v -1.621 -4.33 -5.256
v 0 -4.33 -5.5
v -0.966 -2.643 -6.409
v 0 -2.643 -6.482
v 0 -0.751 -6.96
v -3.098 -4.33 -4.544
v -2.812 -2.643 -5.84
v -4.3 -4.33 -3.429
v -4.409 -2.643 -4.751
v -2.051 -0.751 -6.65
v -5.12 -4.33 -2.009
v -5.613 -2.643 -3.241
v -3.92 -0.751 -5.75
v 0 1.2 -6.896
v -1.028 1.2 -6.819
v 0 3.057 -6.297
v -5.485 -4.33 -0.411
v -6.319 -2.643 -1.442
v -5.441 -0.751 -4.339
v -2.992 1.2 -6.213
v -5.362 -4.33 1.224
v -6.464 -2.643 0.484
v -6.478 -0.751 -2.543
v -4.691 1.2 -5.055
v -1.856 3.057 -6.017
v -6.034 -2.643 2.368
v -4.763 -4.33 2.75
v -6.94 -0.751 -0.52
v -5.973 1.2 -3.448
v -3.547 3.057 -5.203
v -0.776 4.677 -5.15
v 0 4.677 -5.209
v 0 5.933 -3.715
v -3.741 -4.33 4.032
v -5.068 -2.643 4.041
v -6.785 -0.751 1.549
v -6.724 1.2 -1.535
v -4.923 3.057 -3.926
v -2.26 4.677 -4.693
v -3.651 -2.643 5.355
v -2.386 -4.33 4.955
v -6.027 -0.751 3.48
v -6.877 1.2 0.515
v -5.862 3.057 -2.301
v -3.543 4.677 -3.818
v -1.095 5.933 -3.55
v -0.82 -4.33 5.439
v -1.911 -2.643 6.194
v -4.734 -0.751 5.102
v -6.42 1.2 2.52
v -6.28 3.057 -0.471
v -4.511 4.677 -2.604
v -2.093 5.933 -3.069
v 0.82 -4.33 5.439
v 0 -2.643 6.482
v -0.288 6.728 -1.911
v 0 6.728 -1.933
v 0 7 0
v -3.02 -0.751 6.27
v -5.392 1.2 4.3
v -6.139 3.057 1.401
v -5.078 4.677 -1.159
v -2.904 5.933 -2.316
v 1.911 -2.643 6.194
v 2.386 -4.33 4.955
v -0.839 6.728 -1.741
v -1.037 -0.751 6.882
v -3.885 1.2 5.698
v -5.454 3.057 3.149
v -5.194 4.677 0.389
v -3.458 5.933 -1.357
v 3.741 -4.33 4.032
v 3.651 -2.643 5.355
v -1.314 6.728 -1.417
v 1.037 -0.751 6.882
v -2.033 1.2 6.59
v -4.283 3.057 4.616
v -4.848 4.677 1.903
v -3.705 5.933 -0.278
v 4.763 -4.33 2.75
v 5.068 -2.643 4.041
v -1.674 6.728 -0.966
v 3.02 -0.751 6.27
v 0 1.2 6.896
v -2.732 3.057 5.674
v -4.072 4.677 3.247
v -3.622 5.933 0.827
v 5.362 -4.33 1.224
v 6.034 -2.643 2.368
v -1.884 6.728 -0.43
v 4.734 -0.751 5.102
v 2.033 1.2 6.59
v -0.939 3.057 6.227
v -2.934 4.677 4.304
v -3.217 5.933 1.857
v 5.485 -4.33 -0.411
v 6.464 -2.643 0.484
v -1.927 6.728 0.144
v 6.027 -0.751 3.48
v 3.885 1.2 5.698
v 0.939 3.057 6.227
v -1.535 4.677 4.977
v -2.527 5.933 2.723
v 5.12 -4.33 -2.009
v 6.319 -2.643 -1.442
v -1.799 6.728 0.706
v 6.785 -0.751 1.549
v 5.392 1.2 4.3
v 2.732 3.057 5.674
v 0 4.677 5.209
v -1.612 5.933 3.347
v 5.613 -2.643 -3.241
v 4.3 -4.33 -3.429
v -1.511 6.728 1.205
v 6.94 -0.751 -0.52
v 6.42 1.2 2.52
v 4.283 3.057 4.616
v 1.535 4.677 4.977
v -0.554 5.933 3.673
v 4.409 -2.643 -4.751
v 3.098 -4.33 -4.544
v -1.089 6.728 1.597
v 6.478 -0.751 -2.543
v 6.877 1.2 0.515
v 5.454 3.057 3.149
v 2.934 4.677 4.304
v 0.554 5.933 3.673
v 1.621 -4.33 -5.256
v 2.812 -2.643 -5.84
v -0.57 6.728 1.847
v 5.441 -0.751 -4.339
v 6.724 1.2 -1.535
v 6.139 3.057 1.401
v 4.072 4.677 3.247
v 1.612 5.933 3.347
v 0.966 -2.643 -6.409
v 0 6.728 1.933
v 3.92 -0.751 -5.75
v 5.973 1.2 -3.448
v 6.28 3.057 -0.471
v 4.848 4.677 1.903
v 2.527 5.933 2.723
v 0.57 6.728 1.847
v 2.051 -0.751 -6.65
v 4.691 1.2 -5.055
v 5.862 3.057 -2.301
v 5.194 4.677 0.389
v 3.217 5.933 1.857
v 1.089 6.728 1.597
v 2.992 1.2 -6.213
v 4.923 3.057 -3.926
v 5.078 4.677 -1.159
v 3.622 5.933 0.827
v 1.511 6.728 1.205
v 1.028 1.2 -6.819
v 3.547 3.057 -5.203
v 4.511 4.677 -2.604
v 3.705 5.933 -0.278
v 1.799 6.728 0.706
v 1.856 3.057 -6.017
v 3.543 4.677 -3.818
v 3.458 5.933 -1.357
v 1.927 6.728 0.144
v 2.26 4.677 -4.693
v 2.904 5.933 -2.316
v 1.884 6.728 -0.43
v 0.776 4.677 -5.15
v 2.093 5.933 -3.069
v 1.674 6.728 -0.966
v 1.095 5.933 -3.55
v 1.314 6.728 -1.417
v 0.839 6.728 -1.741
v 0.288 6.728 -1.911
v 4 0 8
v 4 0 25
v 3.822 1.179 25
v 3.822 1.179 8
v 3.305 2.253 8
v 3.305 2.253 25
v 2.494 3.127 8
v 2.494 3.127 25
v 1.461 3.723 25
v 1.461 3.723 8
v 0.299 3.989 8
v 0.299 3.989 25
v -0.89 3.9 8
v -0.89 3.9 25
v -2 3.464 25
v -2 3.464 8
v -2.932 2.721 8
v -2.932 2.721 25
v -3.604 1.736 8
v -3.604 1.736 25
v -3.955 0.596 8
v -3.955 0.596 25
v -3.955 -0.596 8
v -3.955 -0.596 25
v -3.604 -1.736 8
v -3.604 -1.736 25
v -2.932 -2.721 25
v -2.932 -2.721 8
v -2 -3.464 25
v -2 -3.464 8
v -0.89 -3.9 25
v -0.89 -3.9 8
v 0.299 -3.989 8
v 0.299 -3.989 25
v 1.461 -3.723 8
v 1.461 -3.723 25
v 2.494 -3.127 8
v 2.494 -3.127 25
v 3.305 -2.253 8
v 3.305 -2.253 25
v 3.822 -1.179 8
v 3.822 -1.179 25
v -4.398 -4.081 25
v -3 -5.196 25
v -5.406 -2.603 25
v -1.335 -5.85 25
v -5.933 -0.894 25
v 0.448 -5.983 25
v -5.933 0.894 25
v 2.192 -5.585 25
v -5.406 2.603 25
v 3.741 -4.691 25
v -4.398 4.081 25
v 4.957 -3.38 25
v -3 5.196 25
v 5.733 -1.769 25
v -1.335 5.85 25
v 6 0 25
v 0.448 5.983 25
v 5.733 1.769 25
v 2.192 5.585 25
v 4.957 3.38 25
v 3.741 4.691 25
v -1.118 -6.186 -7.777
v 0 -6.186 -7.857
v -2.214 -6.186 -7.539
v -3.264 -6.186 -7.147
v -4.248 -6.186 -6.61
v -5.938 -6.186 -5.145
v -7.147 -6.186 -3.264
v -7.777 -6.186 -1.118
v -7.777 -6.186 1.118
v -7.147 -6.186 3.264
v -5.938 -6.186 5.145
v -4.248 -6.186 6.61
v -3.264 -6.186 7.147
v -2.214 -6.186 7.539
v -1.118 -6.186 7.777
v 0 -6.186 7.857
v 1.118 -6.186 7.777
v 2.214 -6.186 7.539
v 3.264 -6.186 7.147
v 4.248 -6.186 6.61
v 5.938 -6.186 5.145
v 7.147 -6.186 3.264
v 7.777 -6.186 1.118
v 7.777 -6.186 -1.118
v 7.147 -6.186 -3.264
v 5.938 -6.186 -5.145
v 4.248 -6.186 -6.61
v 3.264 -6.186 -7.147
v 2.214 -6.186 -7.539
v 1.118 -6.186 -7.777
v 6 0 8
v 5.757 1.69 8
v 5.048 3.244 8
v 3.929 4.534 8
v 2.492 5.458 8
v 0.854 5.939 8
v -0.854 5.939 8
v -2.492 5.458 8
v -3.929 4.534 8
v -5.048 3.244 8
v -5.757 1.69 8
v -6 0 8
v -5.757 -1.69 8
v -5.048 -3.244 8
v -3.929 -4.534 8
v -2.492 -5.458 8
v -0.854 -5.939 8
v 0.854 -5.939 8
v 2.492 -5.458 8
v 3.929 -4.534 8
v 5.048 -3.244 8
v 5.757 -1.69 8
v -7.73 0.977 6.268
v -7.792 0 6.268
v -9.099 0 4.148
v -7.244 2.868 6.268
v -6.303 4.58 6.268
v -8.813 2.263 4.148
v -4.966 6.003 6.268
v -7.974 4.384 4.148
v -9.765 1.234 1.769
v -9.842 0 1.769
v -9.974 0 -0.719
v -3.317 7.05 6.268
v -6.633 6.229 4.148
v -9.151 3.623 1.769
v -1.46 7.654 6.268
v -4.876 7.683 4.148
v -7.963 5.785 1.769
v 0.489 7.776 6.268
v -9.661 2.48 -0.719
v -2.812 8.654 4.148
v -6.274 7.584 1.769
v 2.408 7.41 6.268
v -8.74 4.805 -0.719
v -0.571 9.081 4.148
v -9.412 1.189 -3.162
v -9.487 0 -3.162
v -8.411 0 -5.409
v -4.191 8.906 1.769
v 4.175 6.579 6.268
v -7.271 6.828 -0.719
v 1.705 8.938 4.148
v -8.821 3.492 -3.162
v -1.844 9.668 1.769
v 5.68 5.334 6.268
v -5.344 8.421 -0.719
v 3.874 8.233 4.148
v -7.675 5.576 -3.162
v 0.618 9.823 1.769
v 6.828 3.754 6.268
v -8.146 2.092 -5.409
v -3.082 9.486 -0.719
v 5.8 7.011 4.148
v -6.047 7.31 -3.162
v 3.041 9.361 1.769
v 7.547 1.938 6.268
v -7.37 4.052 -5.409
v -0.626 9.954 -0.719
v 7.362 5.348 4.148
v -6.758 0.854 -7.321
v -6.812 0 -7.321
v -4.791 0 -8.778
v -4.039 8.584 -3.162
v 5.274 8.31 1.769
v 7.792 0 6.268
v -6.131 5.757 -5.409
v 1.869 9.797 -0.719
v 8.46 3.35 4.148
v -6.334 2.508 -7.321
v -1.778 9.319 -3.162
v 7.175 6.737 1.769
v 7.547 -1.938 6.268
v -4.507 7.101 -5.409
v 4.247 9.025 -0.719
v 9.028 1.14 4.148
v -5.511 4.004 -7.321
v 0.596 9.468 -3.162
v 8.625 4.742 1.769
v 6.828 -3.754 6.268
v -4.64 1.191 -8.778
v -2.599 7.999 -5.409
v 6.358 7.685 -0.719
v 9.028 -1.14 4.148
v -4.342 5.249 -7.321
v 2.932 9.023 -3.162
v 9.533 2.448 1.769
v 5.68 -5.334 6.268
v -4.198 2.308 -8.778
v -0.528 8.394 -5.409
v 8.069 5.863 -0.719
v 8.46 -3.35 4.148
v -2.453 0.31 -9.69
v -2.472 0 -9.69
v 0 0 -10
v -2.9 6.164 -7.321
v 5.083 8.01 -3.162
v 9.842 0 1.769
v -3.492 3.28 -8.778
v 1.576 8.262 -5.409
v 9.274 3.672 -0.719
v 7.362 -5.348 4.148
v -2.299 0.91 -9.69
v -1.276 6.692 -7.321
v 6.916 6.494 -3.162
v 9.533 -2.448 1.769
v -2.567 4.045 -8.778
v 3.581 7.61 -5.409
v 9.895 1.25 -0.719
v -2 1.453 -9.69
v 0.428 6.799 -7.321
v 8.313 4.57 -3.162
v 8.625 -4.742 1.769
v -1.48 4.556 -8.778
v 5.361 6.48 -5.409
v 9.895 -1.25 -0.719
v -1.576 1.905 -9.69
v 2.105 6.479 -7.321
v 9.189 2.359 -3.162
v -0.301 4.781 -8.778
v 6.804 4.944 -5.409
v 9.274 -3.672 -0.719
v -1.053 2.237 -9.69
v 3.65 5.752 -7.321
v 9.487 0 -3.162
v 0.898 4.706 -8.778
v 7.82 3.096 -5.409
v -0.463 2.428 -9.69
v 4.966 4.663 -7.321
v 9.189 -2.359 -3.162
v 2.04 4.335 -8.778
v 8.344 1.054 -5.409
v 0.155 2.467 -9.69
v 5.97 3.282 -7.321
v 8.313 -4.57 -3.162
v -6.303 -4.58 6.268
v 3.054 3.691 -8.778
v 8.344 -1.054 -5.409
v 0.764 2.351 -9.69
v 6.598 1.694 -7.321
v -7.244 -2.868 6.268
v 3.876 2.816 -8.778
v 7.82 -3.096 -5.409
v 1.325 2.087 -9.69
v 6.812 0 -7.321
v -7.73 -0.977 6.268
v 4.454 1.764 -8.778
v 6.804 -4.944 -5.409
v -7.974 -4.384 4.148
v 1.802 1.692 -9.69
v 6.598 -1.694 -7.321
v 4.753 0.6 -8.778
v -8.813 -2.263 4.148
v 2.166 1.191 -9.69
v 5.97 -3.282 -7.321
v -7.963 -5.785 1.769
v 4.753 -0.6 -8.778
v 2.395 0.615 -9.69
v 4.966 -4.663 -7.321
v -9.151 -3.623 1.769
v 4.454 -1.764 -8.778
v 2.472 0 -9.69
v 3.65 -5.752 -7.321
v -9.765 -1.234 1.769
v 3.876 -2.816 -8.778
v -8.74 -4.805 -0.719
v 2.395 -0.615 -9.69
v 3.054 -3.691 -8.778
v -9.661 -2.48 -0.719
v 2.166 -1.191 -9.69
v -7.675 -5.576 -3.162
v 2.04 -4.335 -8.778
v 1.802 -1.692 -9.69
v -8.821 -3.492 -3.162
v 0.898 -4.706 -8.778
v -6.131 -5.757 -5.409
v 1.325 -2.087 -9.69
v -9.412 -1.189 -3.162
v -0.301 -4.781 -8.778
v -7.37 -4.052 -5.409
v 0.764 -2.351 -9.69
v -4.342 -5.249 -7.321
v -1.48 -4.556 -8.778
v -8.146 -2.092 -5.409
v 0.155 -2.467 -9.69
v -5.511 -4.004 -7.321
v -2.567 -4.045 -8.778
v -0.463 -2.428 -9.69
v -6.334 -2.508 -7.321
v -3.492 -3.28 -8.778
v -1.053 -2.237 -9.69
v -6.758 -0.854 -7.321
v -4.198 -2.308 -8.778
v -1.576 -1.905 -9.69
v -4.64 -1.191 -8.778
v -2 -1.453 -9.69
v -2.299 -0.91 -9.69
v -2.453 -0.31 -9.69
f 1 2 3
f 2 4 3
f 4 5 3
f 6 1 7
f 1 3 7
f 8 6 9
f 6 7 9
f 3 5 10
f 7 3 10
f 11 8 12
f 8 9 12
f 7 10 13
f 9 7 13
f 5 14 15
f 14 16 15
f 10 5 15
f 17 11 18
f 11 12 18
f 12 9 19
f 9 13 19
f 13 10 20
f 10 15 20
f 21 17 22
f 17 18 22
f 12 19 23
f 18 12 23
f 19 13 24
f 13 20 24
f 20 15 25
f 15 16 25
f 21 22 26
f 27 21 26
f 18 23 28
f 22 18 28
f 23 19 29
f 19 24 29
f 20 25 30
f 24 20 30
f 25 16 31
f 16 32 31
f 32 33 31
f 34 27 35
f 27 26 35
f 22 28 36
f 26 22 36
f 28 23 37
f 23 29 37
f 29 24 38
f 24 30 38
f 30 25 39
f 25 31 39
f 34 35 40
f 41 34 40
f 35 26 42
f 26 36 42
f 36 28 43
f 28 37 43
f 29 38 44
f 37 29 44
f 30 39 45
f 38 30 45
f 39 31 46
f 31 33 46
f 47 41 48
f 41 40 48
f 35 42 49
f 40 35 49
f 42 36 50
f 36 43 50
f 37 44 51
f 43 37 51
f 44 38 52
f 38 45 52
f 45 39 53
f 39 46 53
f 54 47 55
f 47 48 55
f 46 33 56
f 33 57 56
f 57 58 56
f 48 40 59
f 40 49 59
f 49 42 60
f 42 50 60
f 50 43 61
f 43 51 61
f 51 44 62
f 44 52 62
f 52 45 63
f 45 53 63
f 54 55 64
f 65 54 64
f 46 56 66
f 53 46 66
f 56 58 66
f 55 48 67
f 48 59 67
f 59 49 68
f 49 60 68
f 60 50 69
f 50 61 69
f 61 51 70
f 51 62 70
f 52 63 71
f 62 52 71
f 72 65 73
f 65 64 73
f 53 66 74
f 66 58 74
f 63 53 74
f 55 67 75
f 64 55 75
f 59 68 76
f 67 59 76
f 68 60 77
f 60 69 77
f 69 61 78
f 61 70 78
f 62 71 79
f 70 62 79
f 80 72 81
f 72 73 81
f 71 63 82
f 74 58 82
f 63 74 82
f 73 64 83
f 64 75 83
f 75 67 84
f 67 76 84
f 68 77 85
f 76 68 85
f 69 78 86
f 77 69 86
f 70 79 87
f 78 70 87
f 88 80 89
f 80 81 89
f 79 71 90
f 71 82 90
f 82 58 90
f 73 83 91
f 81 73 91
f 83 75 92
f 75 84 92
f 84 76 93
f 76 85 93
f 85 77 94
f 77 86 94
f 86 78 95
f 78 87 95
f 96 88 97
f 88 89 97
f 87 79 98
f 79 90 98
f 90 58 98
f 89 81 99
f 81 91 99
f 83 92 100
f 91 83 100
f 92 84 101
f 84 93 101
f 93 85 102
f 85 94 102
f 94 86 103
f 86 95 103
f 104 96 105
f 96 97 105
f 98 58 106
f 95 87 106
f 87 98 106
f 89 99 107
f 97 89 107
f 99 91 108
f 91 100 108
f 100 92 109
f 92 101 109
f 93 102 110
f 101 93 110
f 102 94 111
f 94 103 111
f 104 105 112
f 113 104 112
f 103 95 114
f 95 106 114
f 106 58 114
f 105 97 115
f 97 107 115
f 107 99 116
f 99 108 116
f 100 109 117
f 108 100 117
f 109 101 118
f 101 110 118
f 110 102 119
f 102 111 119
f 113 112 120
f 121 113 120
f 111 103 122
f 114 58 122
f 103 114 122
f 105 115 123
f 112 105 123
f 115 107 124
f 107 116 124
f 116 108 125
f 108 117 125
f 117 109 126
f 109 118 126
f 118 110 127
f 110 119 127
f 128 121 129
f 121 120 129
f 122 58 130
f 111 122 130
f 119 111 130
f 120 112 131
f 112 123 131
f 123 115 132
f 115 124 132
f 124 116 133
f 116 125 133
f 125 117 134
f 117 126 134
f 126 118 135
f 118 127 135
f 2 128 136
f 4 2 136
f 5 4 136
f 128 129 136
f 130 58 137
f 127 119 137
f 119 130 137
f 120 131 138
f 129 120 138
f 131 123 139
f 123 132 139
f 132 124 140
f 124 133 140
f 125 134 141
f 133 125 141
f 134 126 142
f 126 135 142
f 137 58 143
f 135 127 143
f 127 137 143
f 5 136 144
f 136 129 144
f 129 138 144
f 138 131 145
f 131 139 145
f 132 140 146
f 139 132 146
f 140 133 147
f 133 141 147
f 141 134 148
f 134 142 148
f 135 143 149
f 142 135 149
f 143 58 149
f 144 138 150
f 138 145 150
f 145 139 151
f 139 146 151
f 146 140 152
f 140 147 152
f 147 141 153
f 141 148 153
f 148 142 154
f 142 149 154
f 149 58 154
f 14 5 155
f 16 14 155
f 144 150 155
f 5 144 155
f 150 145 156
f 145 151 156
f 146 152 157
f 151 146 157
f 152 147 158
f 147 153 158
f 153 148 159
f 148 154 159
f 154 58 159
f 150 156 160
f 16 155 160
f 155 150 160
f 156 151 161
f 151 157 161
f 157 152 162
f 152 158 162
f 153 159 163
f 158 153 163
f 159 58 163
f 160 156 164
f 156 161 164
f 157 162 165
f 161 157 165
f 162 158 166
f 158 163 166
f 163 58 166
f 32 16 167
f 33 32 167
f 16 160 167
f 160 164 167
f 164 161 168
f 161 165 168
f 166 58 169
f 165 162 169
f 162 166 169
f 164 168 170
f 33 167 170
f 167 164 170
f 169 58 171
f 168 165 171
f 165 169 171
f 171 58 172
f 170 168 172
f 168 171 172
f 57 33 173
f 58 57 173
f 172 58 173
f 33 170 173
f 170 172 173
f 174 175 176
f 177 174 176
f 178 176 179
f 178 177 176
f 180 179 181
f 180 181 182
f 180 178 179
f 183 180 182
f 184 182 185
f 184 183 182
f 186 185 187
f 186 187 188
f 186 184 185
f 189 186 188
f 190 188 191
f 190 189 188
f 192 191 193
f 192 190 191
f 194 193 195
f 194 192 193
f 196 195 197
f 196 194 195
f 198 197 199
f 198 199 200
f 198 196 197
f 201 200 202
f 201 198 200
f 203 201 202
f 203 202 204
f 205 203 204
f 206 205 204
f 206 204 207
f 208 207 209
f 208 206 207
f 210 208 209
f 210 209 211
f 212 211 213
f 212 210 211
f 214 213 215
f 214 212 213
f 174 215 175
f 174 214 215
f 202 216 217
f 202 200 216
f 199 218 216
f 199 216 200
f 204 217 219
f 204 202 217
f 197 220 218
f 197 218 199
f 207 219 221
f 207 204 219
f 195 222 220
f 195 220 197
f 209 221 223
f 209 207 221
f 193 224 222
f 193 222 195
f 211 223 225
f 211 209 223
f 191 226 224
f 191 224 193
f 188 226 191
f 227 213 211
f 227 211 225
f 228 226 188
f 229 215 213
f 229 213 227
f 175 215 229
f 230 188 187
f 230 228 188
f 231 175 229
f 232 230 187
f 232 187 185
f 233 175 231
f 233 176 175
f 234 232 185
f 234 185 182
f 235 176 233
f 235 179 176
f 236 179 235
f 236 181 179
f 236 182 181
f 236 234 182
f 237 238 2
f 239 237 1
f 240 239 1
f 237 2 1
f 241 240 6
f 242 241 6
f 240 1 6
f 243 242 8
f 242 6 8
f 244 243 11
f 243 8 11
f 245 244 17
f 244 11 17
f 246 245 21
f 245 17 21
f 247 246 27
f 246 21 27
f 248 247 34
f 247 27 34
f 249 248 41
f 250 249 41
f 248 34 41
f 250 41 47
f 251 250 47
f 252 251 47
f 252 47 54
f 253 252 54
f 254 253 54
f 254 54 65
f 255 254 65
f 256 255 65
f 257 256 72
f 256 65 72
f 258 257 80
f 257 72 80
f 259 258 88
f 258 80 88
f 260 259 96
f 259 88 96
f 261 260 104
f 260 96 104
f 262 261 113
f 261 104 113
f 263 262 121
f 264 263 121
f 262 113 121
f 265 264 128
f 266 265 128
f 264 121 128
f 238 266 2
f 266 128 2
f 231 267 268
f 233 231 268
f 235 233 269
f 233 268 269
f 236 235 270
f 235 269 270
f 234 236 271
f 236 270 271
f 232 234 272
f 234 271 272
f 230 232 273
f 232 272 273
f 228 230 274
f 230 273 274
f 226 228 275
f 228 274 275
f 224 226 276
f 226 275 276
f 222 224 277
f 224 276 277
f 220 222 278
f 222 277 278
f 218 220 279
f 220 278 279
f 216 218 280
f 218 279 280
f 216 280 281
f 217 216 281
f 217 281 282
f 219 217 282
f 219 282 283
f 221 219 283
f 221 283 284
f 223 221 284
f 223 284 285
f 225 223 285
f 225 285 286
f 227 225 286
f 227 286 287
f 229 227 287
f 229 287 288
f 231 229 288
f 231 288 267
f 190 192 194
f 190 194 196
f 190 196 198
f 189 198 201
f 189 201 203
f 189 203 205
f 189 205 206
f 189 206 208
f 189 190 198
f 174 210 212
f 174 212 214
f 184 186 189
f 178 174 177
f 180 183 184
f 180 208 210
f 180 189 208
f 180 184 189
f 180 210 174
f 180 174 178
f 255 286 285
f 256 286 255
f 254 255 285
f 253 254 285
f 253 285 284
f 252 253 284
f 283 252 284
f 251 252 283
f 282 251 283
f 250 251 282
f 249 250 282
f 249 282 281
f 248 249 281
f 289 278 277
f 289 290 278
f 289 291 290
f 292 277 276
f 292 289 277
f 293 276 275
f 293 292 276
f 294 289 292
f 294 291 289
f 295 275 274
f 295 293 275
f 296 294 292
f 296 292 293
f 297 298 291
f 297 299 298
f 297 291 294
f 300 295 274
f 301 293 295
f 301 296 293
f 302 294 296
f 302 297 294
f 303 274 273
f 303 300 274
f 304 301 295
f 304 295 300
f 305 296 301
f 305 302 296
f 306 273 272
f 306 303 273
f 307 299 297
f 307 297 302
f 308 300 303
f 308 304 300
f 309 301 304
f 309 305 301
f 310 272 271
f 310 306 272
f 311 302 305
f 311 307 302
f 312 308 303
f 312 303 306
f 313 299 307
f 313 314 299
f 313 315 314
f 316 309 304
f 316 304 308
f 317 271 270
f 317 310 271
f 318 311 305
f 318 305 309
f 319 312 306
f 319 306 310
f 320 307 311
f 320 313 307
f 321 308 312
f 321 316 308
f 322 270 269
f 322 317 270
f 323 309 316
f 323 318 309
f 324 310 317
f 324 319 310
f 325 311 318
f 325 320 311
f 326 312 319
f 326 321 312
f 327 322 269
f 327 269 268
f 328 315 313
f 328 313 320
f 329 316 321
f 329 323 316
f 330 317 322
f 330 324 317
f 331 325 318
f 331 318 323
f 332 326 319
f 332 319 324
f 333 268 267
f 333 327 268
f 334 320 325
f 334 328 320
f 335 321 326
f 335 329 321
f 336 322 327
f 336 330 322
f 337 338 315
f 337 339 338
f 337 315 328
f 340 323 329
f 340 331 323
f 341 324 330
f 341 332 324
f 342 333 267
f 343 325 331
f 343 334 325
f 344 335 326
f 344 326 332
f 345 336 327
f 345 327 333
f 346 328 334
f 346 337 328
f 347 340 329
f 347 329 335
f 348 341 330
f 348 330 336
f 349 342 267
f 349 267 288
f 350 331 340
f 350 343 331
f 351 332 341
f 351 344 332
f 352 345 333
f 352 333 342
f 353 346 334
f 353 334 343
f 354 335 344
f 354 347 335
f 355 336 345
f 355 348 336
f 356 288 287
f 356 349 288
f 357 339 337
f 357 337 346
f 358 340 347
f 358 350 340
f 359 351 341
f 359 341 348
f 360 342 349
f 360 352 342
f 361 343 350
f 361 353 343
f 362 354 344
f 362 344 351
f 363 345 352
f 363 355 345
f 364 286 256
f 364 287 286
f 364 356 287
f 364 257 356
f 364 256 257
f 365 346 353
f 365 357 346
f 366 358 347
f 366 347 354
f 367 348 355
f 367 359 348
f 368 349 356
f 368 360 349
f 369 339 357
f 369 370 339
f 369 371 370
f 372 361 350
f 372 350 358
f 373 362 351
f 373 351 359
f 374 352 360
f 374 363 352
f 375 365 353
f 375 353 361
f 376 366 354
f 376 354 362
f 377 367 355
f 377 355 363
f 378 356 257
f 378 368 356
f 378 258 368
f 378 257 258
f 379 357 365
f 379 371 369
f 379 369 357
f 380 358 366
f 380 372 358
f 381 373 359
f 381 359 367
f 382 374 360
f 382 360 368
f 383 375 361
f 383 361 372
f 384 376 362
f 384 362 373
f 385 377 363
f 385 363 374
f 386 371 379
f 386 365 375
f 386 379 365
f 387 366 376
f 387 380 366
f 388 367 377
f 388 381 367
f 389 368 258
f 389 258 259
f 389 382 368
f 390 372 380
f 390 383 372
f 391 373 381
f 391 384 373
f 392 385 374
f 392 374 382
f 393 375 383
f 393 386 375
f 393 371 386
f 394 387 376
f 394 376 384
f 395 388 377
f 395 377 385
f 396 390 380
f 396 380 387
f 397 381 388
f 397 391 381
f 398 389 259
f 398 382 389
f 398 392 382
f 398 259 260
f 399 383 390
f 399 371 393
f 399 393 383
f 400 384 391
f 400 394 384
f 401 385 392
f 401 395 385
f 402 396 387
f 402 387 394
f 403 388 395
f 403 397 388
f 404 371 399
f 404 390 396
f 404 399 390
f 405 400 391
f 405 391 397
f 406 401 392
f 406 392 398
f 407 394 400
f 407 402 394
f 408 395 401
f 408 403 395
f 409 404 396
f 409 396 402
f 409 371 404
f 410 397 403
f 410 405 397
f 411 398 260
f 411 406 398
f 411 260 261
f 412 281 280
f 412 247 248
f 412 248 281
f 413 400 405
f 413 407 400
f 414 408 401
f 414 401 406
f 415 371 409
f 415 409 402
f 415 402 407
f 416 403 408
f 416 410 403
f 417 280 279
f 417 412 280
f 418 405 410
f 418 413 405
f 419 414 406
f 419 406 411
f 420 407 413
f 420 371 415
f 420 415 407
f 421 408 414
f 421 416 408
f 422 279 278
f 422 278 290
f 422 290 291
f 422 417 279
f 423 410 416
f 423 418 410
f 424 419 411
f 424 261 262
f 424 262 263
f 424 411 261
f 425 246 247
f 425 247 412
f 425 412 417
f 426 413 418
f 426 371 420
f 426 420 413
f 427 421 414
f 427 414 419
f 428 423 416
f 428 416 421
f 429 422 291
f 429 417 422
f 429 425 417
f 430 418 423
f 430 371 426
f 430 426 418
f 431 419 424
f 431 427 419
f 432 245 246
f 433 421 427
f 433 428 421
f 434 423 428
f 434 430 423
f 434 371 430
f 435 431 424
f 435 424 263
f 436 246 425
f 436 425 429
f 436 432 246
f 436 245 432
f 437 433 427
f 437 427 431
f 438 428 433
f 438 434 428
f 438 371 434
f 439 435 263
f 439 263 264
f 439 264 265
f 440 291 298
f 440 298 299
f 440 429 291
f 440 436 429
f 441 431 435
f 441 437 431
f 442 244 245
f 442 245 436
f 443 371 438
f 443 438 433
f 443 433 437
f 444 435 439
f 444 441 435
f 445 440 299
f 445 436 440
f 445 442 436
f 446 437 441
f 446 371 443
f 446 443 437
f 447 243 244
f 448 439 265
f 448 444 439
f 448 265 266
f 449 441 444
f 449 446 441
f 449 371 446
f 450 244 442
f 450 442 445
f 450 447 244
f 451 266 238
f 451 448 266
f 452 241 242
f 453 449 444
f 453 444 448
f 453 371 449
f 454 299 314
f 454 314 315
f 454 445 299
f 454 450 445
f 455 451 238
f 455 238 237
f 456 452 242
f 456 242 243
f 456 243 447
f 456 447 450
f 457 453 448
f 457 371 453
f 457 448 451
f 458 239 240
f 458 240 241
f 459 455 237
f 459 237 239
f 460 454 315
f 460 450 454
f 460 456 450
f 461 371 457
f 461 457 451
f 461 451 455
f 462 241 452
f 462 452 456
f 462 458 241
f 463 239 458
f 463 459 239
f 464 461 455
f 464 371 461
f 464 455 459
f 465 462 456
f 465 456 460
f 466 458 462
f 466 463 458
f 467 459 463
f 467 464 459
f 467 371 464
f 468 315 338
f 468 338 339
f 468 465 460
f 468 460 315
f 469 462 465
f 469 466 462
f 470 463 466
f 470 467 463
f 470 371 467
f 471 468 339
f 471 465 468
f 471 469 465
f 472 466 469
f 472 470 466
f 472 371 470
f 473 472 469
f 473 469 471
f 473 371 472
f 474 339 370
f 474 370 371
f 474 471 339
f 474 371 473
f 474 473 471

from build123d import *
from OCP.BRepAlgoAPI import BRepAlgoAPI_Cut
from OCP.TopTools import TopTools_ListOfShape

# Parameters (mm, degrees)
SKETCH_1_R          = 6
SKETCH_1_R_2        = 4
EXTRUDE_1_DEPTH     = 25
CUT_EXTRUDE_START   = -17
SKETCH_3_R          = 4
CUT_EXTRUDE_2_DEPTH = 17


with BuildPart() as part:
    # 草图1 → 凸台-拉伸1 (new body)
    with BuildSketch(Plane.XY):
        Circle(SKETCH_1_R)
        Circle(SKETCH_1_R_2, mode=Mode.SUBTRACT)
    extrude(amount=EXTRUDE_1_DEPTH)

    # 草图2 → 旋转3 (revolve)
    with BuildSketch(Plane(origin=(0, 0, 0), x_dir=(1, 0, 0), z_dir=(0, 1, 0))):
        with BuildLine():
            Line((0, 10), (0, -10))
            ThreePointArc((0, -10), (-10, 0), (0, 10))
        make_face()
    revolve(axis=Axis((0, 0, 0), (0, 0, -1)))

    # 草图3 → 切除-拉伸2 (cut)
    with BuildSketch(Plane.XY.offset(25).offset(CUT_EXTRUDE_START)):
        Circle(SKETCH_3_R)
    extrude(amount=CUT_EXTRUDE_2_DEPTH, mode=Mode.SUBTRACT)


with BuildPart() as cut_revolve_1_tool:
    # 草图4 → 切除-旋转1 (revolve)
    with BuildSketch(Plane(origin=(0, 0, 0), x_dir=(0, 0, -1), z_dir=(1, 0, 0))):
        with BuildLine():
            Line((0, 7), (0, -7))
            Line((0, -7), (0, -10))
            Line((0, -10), (6, -10))
            Line((6, -10), (7.857142857, -6.185895741))
            Line((7.857142857, -6.185895741), (5.5, -4.330127019))
            ThreePointArc((5.5, -4.330127019), (6.297256908, 3.056886559), (0, 7))
        make_face()
    revolve(axis=Axis((0, 0, 0), (0, 1, 0)))


with BuildPart() as part_1:
    add(part.part)

    # 切除-旋转1: cut by cut_revolve_1_tool, with a tolerance
    cut_revolve_1_stock = TopTools_ListOfShape()
    cut_revolve_1_stock.Append(part_1.part.wrapped)
    cut_revolve_1_tools = TopTools_ListOfShape()
    cut_revolve_1_tools.Append(cut_revolve_1_tool.part.wrapped)
    cut_revolve_1_cut = BRepAlgoAPI_Cut()
    cut_revolve_1_cut.SetArguments(cut_revolve_1_stock)
    cut_revolve_1_cut.SetTools(cut_revolve_1_tools)
    cut_revolve_1_cut.SetFuzzyValue(0.00001)
    cut_revolve_1_cut.Build()
    add(Compound.cast(cut_revolve_1_cut.Shape()).solids(), mode=Mode.REPLACE)


solid = part_1.part
